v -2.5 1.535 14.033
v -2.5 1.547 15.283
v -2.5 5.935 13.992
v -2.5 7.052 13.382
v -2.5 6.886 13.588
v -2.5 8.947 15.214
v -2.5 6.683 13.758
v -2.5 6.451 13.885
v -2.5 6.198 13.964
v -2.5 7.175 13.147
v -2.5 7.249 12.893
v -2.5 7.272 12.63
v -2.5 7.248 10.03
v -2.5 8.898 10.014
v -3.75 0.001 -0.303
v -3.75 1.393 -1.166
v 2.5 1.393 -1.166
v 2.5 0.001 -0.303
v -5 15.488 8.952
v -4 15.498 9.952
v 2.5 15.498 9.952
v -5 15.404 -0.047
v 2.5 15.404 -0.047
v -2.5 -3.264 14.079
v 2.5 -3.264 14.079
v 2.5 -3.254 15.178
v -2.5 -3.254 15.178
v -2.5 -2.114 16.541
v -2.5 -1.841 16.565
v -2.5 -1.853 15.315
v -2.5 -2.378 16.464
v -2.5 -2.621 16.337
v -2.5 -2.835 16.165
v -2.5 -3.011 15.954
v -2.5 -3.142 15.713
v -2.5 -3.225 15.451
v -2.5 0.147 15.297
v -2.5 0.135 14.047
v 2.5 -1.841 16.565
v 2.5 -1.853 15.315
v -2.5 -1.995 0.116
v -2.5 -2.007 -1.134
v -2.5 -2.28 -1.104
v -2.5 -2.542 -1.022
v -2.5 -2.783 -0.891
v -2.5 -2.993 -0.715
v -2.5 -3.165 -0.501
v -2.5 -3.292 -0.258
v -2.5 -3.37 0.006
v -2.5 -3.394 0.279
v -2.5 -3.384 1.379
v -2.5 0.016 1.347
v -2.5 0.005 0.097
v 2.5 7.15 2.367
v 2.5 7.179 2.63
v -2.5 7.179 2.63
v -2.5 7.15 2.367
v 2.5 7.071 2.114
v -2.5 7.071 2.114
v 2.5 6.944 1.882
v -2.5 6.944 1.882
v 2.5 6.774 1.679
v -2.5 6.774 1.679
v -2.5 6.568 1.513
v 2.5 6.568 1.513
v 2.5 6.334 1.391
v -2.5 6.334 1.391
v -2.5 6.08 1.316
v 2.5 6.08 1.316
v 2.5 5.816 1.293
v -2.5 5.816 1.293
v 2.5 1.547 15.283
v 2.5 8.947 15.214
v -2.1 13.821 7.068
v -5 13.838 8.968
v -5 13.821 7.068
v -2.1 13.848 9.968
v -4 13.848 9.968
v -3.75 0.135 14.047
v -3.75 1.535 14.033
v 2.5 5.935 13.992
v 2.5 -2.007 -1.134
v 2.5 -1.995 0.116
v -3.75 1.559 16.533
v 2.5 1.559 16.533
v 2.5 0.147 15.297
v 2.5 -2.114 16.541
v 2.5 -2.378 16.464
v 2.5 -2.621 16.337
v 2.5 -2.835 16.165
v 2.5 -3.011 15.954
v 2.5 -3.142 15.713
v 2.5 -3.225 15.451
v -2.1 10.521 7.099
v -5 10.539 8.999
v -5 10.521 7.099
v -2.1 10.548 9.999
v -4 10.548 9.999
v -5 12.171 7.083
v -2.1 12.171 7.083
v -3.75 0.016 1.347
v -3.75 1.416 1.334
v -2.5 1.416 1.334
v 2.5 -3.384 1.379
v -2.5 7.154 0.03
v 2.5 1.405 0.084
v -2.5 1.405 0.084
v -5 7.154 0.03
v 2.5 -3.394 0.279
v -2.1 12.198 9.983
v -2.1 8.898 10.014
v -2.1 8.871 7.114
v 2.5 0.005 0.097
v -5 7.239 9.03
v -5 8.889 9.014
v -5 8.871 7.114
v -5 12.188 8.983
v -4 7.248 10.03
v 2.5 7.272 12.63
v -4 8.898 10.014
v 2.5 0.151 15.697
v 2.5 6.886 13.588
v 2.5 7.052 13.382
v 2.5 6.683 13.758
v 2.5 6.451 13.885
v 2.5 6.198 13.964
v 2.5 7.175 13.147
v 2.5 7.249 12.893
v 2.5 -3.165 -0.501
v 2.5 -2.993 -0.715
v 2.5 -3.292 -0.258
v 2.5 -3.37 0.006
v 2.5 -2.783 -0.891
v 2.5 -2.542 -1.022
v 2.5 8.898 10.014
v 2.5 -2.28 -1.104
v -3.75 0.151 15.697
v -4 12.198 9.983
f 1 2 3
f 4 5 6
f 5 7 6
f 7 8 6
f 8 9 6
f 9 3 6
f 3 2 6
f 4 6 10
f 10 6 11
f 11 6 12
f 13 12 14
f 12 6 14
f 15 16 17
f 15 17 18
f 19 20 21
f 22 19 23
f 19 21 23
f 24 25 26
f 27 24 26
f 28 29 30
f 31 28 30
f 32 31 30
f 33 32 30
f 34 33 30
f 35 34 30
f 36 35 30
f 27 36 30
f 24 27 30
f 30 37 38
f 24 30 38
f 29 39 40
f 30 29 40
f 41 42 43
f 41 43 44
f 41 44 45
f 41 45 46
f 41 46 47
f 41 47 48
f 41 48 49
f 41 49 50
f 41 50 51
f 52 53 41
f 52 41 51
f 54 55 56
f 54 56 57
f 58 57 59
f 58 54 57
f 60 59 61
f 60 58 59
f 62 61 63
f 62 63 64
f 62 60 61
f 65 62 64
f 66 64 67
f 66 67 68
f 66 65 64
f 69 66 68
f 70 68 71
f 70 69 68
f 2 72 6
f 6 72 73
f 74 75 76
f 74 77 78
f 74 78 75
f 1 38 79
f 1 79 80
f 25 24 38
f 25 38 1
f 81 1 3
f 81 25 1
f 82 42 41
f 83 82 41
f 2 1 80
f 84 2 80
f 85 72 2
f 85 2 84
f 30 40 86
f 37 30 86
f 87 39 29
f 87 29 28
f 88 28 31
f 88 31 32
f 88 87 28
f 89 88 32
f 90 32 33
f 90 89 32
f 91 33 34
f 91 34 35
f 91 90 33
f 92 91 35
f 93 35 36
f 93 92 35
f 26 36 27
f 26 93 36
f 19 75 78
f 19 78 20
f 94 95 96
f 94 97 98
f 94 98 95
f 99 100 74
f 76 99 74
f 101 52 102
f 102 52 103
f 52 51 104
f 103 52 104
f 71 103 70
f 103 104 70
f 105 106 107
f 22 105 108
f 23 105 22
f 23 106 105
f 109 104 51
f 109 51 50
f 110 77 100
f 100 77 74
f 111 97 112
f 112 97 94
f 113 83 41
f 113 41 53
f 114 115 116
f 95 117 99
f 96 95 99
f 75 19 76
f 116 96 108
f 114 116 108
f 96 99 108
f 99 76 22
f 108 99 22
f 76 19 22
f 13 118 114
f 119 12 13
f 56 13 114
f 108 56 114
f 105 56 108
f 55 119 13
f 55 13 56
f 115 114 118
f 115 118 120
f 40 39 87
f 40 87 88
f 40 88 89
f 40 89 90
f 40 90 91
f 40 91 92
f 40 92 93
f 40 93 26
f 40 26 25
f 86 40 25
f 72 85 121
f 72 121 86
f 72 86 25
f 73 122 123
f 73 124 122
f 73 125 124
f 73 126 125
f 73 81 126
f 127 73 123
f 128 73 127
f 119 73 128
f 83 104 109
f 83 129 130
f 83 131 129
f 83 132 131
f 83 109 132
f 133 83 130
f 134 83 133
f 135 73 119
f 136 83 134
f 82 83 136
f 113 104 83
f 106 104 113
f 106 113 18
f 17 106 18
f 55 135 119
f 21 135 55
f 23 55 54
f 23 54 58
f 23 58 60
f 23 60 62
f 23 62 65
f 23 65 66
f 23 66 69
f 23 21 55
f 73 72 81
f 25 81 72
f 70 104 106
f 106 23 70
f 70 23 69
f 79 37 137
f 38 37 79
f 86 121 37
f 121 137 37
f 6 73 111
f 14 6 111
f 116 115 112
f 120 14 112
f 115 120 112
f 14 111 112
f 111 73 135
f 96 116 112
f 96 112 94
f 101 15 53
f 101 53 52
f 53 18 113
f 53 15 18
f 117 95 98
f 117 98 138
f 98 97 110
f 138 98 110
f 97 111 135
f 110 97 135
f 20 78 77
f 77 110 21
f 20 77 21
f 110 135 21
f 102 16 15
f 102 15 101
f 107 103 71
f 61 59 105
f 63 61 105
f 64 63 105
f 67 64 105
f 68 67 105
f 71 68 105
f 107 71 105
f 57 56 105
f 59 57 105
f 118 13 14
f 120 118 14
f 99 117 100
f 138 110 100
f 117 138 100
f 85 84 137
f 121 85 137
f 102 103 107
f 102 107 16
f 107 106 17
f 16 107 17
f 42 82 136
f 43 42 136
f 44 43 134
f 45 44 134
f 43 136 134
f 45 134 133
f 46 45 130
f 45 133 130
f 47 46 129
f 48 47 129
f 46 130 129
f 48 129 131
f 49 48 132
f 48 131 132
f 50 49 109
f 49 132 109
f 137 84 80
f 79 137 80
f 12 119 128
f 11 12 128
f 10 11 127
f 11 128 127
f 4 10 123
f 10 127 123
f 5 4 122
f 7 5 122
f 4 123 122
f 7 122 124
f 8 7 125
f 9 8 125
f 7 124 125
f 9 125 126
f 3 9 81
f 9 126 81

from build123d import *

# Parameters (mm, degrees)
PAD017_DEPTH              = 5
PAD020_DEPTH              = 6.25
SKETCH038_W               = 10
SKETCH038_H               = 1.65
PAD021_DEPTH              = 5
SKETCH085_W               = 10
SKETCH085_H               = 1.65
PAD054_DEPTH              = 7.5
SKETCH083_W               = 7.1
SKETCH083_H               = 1.65
PAD055_DEPTH              = 7.5
SKETCH082_W               = 10
SKETCH082_H               = 1.65
PAD056_DEPTH              = 4.6
SKETCH084_W               = 10
SKETCH084_H               = 1.65
PAD057_DEPTH              = 7.5
LINEARPATTERN019_COUNT    = 2
LINEARPATTERN019_PITCH    = 3.3
CHAMFER009_SIZE           = 1
MIRROR008_PLACEMENT_ANGLE = 90


with BuildPart() as bc_c:
    # Sketch034 → Pad017 (new body)
    with BuildSketch(Plane.XY):
        with BuildLine():
            Line((-1.35, -1.8), (-1.35, 6))
            ThreePointArc((0, 7.35), (-0.954594, 6.954594), (-1.35, 6))
            Line((0, 9), (0, 7.35))
            Line((-2.6, 9), (0, 9))
            Line((-2.6, -1.8), (-2.6, 9))
            Line((-3.85, -1.8), (-2.6, -1.8))
            ThreePointArc((-3.85, -1.8), (-3.439949, -2.789949), (-2.45, -3.2))
            Line((-1.35, -3.2), (-2.45, -3.2))
            Line((-1.35, -1.8), (-1.35, -3.2))
        make_face()
    extrude(amount=PAD017_DEPTH)

    # Sketch037 → Pad020 (join)
    with BuildSketch(Plane.XY):
        Polygon((-1.35, 0.2), (-1.35, 1.6), (-2.6, 1.6), (-3.85, 1.6), (-3, 0.2), (-2.6, 0.2), align=None)
    extrude(amount=PAD020_DEPTH)


with BuildPart() as body029:
    # Mirror002: instance of _bc_c
    add(bc_c.part.mirror(Plane(origin=(5, 0, 0), x_dir=(0, 1, 0), z_dir=(-1, 0, 0))))

    # Fusion002: union _bc_c
    add(bc_c.part)


with BuildPart() as body029_1:
    # Clone003 placement: moved
    add(body029.part.moved(Location((-5, 0, 0))))

    # Sketch038 → Pad021 (new body)
    with BuildSketch(Plane.XY):
        with Locations((0, 8.175)):
            Rectangle(SKETCH038_W, SKETCH038_H)
    extrude(amount=PAD021_DEPTH)

    # Sketch085 → Pad054 (new body)
    with BuildSketch(Plane.XY):
        with Locations((2.6, 8.175)):
            Rectangle(SKETCH085_W, SKETCH085_H)
    extrude(amount=PAD054_DEPTH)

    # Sketch083 → Pad055 (join)
    with BuildSketch(Plane.XY):
        with Locations((4.05, 9.825)):
            Rectangle(SKETCH083_W, SKETCH083_H)
    pad055 = extrude(amount=PAD055_DEPTH)

    # Sketch082 → Pad056 (join)
    with BuildSketch(Plane.XY):
        with Locations((2.6, 9.825)):
            Rectangle(SKETCH082_W, SKETCH082_H)
    pad056 = extrude(amount=PAD056_DEPTH)

    # Sketch084 → Pad057 (join)
    with BuildSketch(Plane.XY):
        with Locations((2.6, 11.475)):
            Rectangle(SKETCH084_W, SKETCH084_H)
    pad057 = extrude(amount=PAD057_DEPTH)

    # LinearPattern019: Pad057, Pad056, Pad055 ×2
    with Locations(*[(0, i * LINEARPATTERN019_PITCH, 0) for i in range(1, LINEARPATTERN019_COUNT)]):
        add(pad057)
        add(pad056)
        add(pad055)

    # Chamfer009
    chamfer009_edges = [body029_1.edges().sort_by_distance(p)[0] for p in [
        (-2.4, 8.175, 7.5),
        (-2.4, 11.475, 7.5),
        (-2.4, 14.775, 7.5),
    ]]
    chamfer(chamfer009_edges, length=CHAMFER009_SIZE)


with BuildPart() as mirror008:
    # Mirror008: instance of Body029
    add(body029_1.part.mirror(Plane(origin=(-13.185052, -8.707698, 3.680996), x_dir=(-0.004692, 0.999989, 0), z_dir=(-0.999989, -0.004692, -1e-06))))


with BuildPart() as mirror008_1:
    # Mirror008 placement: moved
    add(mirror008.part.moved(Location((2.5, 0, 34.15))).rotate(Axis((2.5, 0, 34.15), (0, -1, 0)), MIRROR008_PLACEMENT_ANGLE))


solid = mirror008_1.part
